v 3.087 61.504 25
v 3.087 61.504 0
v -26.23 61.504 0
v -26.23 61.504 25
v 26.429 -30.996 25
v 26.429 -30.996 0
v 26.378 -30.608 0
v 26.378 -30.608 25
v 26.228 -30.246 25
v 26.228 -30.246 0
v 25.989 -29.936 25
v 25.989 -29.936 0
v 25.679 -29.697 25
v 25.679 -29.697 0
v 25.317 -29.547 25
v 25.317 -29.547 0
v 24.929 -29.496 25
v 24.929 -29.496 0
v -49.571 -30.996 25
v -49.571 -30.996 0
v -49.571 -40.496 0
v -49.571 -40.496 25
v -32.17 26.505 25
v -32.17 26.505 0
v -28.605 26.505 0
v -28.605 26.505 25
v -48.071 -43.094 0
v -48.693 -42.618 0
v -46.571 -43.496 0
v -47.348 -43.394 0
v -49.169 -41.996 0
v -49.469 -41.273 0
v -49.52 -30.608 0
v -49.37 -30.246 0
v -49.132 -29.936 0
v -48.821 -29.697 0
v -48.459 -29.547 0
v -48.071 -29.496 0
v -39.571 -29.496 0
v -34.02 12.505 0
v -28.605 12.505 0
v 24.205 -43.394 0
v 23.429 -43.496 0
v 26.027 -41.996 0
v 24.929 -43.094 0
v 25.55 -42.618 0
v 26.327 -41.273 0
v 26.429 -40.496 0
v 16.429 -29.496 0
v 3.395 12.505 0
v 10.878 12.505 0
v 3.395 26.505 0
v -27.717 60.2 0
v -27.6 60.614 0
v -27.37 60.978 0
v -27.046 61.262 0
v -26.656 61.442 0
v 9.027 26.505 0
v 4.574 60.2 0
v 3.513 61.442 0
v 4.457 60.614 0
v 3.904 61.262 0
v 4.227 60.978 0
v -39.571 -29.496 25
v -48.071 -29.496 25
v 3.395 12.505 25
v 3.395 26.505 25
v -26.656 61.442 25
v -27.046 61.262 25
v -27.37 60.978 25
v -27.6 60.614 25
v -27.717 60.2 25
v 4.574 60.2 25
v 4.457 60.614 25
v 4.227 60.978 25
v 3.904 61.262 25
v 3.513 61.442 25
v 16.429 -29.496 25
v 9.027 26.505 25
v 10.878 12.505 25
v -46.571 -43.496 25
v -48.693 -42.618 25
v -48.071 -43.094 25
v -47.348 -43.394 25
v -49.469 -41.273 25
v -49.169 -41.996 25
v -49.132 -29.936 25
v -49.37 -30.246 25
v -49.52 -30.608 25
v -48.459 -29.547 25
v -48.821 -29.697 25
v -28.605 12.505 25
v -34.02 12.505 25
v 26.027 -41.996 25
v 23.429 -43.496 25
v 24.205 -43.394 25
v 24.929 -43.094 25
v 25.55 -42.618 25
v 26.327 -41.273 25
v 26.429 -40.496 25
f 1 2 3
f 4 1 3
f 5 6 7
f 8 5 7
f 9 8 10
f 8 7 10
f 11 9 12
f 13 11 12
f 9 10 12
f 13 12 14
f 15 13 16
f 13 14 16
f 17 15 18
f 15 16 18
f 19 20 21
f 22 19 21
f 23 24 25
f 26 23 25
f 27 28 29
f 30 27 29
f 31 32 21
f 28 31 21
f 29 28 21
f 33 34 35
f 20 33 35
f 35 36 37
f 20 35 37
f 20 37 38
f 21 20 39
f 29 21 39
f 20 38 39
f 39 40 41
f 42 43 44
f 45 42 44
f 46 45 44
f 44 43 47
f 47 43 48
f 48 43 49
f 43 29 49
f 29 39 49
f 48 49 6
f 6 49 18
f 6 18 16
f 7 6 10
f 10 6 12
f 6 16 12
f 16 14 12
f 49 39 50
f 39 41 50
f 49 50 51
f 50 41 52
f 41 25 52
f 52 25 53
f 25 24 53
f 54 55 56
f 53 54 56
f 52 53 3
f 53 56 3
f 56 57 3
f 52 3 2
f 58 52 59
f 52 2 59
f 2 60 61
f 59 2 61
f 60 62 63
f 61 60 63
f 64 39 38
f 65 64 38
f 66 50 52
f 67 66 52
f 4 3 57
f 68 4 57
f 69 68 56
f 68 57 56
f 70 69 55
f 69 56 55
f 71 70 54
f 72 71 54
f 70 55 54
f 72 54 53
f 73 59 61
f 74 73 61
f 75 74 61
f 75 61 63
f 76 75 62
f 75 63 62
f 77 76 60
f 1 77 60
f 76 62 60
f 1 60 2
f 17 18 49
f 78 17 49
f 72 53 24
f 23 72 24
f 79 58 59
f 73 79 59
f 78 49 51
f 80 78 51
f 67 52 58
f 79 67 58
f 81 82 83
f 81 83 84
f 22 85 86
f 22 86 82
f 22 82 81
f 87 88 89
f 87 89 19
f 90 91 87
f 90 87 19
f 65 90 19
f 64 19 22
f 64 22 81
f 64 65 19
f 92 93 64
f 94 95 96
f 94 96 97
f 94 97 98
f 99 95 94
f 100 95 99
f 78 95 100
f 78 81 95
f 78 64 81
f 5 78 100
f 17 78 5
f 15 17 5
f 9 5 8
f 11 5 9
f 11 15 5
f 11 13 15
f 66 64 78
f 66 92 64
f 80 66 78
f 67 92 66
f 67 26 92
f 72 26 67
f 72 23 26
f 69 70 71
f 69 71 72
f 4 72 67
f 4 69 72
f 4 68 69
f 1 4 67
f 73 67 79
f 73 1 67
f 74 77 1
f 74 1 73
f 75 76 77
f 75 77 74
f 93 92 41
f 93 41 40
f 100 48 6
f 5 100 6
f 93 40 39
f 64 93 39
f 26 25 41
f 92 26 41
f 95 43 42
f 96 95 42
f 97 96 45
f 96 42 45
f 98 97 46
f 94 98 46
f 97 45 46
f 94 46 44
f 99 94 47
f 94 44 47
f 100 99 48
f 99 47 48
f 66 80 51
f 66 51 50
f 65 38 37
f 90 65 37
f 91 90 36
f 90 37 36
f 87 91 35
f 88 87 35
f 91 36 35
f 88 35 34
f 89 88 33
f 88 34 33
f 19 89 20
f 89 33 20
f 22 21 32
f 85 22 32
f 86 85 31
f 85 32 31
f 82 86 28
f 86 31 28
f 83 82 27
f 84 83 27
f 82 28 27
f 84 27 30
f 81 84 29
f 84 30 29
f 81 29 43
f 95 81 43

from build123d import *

# Parameters (mm, degrees)
F1_DEPTH = 25


with BuildPart() as f1:
    # F0 (on Top) → F1 (new body)
    with BuildSketch(Plane.XY):
        with BuildLine():
            ThreePointArc((-49.571264, -40.496381), (-48.692584, -42.617702), (-46.571264, -43.496381))
            Line((-46.571264, -43.496381), (-39.571264, -43.496381))
            Line((-39.571264, -43.496381), (-27.571264, -43.496381))
            Line((-27.571264, -43.496381), (-11.571264, -43.496381))
            Line((-11.571264, -43.496381), (-11.571264, 12.504975))
            Line((-11.571264, 12.504975), (-28.604711, 12.504975))
            Line((-28.604711, 12.504975), (-34.020273, 12.504975))
            Line((-34.020273, 12.504975), (-39.571264, -29.496381))
            Line((-39.571264, -29.496381), (-48.071264, -29.496381))
            ThreePointArc((-48.071264, -29.496381), (-49.131924, -29.935721), (-49.571264, -30.996381))
            Line((-49.571264, -30.996381), (-49.571264, -40.496381))
        make_face()
        with BuildLine():
            Line((-11.571264, 12.504975), (-11.571264, -43.496381))
            Line((-11.571264, -43.496381), (4.428736, -43.496381))
            Line((4.428736, -43.496381), (16.428736, -43.496381))
            Line((16.428736, -43.496381), (23.428736, -43.496381))
            ThreePointArc((23.428736, -43.496381), (25.550056, -42.617702), (26.428736, -40.496381))
            Line((26.428736, -40.496381), (26.428736, -30.996381))
            ThreePointArc((26.428736, -30.996381), (25.989396, -29.935721), (24.928736, -29.496381))
            Line((24.928736, -29.496381), (16.428736, -29.496381))
            Line((16.428736, -29.496381), (10.877745, 12.504975))
            Line((10.877745, 12.504975), (3.395289, 12.504975))
            Line((3.395289, 12.504975), (-11.571264, 12.504975))
        make_face()
        with BuildLine():
            Line((-28.604711, 12.504975), (-11.571264, 12.504975))
            Line((-11.571264, 12.504975), (-11.571264, 61.503619))
            Line((-11.571264, 61.503619), (-26.229704, 61.503619))
            ThreePointArc((-26.229704, 61.503619), (-27.21844, 61.131626), (-27.716773, 60.200153))
            Line((-27.716773, 60.200153), (-32.170002, 26.504975))
            Line((-32.170002, 26.504975), (-28.604711, 26.504975))
            Line((-28.604711, 26.504975), (-28.604711, 12.504975))
        make_face()
        Polygon((-11.571264, 61.503619), (-11.571264, 12.504975), (3.395289, 12.504975), (3.395289, 26.504975), (3.087176, 61.503619), align=None)
        with BuildLine():
            ThreePointArc((4.574245, 60.200153), (4.075913, 61.131626), (3.087176, 61.503619))
            Line((3.087176, 61.503619), (3.395289, 26.504975))
            Line((3.395289, 26.504975), (9.027474, 26.504975))
            Line((9.027474, 26.504975), (4.574245, 60.200153))
        make_face()
    extrude(amount=F1_DEPTH)


solid = f1.part
